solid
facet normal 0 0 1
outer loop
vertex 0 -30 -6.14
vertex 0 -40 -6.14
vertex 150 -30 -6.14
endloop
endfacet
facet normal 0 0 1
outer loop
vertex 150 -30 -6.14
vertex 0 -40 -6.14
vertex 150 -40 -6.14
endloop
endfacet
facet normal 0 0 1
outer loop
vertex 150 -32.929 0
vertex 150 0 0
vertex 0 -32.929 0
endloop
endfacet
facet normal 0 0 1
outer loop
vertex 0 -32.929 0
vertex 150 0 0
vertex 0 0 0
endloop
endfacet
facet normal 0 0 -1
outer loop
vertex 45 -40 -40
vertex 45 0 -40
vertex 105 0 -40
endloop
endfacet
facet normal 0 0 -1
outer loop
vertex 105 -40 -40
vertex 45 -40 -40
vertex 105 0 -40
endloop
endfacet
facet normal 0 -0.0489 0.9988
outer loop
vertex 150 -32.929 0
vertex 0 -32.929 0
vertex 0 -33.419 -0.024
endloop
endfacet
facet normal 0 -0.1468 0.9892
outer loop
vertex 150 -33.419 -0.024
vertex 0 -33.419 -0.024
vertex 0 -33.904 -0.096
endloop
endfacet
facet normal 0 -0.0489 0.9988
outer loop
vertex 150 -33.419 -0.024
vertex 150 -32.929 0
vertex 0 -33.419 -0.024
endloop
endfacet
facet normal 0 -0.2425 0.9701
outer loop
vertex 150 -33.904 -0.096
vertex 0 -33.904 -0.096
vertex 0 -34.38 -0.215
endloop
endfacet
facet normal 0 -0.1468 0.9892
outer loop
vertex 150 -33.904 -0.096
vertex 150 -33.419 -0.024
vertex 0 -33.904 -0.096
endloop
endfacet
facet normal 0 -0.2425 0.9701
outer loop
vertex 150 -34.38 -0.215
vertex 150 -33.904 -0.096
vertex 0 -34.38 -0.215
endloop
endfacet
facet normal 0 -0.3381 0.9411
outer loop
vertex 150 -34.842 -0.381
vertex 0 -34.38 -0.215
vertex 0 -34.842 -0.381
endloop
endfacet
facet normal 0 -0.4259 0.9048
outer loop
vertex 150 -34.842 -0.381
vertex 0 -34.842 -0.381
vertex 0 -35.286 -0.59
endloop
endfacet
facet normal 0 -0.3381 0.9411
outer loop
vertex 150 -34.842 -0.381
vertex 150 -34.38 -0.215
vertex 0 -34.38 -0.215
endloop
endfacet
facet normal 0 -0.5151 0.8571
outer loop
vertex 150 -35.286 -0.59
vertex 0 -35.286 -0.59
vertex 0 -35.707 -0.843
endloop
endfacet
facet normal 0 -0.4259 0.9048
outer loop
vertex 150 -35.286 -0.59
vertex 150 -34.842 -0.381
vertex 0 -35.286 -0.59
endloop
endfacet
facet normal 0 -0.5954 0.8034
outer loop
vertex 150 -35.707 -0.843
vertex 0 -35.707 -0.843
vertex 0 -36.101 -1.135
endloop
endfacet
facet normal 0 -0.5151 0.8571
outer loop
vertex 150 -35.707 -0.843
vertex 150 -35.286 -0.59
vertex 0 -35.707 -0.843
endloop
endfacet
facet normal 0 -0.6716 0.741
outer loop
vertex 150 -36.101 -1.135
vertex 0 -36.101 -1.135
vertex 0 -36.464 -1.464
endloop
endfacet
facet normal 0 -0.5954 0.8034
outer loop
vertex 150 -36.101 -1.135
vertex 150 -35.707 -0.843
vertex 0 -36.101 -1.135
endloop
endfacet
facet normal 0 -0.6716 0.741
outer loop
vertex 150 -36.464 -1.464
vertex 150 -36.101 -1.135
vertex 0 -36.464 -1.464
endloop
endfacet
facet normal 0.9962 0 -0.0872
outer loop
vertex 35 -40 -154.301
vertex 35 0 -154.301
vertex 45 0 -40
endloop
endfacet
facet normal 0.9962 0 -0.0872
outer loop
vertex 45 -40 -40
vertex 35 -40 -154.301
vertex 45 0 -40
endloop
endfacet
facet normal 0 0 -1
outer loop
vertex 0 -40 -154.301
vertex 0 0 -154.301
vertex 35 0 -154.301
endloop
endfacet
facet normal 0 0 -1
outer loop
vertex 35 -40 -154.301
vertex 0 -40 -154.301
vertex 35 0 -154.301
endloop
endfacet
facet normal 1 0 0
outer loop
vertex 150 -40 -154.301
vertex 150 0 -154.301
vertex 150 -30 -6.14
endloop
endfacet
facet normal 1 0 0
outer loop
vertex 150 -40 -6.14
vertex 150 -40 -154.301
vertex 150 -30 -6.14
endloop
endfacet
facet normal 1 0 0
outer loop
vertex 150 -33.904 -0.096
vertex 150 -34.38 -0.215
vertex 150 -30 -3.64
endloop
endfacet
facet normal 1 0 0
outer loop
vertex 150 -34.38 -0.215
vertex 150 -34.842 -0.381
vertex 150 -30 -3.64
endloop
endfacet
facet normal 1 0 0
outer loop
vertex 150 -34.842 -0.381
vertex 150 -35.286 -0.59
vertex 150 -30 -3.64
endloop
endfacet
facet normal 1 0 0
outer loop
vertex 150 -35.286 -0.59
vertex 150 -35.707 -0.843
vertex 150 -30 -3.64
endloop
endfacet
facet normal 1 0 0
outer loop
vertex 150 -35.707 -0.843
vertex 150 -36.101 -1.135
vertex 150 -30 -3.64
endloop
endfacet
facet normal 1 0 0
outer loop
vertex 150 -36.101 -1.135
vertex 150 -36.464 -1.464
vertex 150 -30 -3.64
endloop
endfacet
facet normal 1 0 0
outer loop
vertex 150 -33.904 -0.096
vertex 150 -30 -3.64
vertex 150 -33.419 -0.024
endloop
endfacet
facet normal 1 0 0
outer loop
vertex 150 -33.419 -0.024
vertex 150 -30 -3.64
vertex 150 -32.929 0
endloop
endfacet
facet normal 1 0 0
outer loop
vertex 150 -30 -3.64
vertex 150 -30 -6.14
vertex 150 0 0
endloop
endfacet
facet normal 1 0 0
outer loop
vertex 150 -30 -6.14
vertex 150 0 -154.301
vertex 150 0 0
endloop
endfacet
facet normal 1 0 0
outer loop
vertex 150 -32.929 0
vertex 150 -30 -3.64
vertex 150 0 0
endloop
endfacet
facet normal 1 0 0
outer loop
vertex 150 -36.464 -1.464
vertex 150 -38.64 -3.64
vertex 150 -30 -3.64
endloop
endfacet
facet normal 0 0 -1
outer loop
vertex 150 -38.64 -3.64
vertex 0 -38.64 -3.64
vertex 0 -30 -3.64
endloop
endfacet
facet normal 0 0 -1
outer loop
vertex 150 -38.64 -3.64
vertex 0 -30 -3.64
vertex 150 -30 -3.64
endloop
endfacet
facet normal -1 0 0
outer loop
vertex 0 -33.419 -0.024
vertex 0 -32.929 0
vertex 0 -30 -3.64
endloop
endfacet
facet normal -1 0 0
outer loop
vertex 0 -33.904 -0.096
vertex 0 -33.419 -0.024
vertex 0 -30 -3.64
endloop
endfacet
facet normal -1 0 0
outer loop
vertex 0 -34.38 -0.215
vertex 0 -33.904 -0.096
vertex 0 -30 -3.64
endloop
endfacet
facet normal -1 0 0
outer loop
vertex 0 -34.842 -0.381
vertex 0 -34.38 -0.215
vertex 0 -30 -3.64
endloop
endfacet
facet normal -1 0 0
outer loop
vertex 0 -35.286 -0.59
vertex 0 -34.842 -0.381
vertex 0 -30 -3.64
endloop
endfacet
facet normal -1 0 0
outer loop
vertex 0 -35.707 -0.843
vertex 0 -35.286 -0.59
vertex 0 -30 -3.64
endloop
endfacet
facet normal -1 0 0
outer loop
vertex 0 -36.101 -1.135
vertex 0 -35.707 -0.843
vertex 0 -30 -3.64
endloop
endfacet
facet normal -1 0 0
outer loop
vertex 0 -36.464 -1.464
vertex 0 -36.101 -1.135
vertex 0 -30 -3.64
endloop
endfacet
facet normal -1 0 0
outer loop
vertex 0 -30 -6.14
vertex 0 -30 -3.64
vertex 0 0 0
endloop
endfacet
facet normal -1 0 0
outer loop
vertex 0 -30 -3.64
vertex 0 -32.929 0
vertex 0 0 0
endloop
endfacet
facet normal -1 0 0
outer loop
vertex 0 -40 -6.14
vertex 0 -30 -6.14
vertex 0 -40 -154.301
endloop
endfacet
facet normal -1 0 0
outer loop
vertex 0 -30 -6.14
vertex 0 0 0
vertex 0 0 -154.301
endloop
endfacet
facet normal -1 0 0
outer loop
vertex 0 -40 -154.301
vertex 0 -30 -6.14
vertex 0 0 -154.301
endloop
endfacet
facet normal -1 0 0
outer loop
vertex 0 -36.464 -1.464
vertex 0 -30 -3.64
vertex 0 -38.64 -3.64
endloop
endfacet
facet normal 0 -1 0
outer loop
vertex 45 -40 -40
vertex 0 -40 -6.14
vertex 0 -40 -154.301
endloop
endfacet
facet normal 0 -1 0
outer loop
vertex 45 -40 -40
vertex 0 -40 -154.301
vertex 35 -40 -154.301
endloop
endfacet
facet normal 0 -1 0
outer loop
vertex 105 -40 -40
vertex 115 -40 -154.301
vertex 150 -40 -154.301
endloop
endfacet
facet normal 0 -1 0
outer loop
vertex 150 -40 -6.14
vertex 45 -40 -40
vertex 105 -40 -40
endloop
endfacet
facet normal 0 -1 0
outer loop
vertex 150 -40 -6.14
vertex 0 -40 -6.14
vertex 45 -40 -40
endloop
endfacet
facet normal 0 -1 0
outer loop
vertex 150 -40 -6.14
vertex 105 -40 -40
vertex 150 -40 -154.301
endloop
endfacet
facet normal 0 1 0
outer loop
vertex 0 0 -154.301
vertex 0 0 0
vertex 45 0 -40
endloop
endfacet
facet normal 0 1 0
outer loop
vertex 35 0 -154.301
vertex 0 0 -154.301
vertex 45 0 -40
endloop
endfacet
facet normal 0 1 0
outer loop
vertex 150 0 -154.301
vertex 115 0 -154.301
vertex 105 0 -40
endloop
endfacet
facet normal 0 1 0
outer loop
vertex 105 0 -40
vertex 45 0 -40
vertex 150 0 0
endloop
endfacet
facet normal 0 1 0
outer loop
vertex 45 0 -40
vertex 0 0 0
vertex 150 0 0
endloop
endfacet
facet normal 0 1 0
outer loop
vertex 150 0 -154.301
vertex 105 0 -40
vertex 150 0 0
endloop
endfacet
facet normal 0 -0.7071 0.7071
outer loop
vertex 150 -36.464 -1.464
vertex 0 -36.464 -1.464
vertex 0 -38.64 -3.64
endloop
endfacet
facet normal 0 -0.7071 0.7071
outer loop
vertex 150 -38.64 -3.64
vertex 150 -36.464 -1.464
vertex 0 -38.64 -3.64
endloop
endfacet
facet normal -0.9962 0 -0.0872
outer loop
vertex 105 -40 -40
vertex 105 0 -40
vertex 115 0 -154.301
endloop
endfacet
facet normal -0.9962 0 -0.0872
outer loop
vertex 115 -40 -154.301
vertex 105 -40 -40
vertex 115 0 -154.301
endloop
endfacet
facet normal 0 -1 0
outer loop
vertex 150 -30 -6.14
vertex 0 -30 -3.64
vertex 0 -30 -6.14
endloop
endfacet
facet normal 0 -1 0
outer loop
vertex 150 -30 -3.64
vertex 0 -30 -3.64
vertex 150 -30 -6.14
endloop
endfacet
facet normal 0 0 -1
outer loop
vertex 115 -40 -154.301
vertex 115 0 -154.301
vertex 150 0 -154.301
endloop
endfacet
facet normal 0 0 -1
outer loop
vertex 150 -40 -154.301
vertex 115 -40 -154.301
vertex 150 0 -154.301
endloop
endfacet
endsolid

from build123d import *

# Parameters (mm, degrees)
F1_DEPTH    = 40
F2_W        = 150
F2_H        = 2.5
F3_DEPTH    = 10
F4_T1_DEPTH = 175.7168298797
F5_R        = 5


# Not quite as in the source:
# - a fillet or chamfer that OpenCascade refuses, or shapes differently, is made with other operations: its cross-section is extruded or revolved along the edge and cut away or added


with BuildPart() as f1:
    # F0 (on Front) → F1 (new body)
    with BuildSketch(Plane.XZ):
        Polygon((150, 0), (0, 0), (0, -154.3005230276), (35, -154.3005230276), (45, -40), (105, -40), (115, -154.3005230276), (150, -154.3005230276), align=None)
    extrude(amount=F1_DEPTH)

    # F2 (on face) → F3 (cut)
    with BuildSketch(Plane.XZ.offset(40)):
        with Locations((75, -4.8898250982)):
            Rectangle(F2_W, F2_H)
    extrude(amount=-F3_DEPTH, mode=Mode.SUBTRACT)

    # F4: chamfer of 5 on 1 edges, made by hand

    # F4_s2 → F4_t1 (cut)
    with BuildSketch(Plane.YZ.offset(-12.8584149398)):
        Polygon((-35, 0), (-40, -5), (-40, 0), align=None)
    extrude(amount=F4_T1_DEPTH, mode=Mode.SUBTRACT)

    # F5
    f5_edges = [f1.edges().sort_by_distance(p)[0] for p in [
        (75, -35, 0),
    ]]
    fillet(f5_edges, radius=F5_R)


solid = f1.part
